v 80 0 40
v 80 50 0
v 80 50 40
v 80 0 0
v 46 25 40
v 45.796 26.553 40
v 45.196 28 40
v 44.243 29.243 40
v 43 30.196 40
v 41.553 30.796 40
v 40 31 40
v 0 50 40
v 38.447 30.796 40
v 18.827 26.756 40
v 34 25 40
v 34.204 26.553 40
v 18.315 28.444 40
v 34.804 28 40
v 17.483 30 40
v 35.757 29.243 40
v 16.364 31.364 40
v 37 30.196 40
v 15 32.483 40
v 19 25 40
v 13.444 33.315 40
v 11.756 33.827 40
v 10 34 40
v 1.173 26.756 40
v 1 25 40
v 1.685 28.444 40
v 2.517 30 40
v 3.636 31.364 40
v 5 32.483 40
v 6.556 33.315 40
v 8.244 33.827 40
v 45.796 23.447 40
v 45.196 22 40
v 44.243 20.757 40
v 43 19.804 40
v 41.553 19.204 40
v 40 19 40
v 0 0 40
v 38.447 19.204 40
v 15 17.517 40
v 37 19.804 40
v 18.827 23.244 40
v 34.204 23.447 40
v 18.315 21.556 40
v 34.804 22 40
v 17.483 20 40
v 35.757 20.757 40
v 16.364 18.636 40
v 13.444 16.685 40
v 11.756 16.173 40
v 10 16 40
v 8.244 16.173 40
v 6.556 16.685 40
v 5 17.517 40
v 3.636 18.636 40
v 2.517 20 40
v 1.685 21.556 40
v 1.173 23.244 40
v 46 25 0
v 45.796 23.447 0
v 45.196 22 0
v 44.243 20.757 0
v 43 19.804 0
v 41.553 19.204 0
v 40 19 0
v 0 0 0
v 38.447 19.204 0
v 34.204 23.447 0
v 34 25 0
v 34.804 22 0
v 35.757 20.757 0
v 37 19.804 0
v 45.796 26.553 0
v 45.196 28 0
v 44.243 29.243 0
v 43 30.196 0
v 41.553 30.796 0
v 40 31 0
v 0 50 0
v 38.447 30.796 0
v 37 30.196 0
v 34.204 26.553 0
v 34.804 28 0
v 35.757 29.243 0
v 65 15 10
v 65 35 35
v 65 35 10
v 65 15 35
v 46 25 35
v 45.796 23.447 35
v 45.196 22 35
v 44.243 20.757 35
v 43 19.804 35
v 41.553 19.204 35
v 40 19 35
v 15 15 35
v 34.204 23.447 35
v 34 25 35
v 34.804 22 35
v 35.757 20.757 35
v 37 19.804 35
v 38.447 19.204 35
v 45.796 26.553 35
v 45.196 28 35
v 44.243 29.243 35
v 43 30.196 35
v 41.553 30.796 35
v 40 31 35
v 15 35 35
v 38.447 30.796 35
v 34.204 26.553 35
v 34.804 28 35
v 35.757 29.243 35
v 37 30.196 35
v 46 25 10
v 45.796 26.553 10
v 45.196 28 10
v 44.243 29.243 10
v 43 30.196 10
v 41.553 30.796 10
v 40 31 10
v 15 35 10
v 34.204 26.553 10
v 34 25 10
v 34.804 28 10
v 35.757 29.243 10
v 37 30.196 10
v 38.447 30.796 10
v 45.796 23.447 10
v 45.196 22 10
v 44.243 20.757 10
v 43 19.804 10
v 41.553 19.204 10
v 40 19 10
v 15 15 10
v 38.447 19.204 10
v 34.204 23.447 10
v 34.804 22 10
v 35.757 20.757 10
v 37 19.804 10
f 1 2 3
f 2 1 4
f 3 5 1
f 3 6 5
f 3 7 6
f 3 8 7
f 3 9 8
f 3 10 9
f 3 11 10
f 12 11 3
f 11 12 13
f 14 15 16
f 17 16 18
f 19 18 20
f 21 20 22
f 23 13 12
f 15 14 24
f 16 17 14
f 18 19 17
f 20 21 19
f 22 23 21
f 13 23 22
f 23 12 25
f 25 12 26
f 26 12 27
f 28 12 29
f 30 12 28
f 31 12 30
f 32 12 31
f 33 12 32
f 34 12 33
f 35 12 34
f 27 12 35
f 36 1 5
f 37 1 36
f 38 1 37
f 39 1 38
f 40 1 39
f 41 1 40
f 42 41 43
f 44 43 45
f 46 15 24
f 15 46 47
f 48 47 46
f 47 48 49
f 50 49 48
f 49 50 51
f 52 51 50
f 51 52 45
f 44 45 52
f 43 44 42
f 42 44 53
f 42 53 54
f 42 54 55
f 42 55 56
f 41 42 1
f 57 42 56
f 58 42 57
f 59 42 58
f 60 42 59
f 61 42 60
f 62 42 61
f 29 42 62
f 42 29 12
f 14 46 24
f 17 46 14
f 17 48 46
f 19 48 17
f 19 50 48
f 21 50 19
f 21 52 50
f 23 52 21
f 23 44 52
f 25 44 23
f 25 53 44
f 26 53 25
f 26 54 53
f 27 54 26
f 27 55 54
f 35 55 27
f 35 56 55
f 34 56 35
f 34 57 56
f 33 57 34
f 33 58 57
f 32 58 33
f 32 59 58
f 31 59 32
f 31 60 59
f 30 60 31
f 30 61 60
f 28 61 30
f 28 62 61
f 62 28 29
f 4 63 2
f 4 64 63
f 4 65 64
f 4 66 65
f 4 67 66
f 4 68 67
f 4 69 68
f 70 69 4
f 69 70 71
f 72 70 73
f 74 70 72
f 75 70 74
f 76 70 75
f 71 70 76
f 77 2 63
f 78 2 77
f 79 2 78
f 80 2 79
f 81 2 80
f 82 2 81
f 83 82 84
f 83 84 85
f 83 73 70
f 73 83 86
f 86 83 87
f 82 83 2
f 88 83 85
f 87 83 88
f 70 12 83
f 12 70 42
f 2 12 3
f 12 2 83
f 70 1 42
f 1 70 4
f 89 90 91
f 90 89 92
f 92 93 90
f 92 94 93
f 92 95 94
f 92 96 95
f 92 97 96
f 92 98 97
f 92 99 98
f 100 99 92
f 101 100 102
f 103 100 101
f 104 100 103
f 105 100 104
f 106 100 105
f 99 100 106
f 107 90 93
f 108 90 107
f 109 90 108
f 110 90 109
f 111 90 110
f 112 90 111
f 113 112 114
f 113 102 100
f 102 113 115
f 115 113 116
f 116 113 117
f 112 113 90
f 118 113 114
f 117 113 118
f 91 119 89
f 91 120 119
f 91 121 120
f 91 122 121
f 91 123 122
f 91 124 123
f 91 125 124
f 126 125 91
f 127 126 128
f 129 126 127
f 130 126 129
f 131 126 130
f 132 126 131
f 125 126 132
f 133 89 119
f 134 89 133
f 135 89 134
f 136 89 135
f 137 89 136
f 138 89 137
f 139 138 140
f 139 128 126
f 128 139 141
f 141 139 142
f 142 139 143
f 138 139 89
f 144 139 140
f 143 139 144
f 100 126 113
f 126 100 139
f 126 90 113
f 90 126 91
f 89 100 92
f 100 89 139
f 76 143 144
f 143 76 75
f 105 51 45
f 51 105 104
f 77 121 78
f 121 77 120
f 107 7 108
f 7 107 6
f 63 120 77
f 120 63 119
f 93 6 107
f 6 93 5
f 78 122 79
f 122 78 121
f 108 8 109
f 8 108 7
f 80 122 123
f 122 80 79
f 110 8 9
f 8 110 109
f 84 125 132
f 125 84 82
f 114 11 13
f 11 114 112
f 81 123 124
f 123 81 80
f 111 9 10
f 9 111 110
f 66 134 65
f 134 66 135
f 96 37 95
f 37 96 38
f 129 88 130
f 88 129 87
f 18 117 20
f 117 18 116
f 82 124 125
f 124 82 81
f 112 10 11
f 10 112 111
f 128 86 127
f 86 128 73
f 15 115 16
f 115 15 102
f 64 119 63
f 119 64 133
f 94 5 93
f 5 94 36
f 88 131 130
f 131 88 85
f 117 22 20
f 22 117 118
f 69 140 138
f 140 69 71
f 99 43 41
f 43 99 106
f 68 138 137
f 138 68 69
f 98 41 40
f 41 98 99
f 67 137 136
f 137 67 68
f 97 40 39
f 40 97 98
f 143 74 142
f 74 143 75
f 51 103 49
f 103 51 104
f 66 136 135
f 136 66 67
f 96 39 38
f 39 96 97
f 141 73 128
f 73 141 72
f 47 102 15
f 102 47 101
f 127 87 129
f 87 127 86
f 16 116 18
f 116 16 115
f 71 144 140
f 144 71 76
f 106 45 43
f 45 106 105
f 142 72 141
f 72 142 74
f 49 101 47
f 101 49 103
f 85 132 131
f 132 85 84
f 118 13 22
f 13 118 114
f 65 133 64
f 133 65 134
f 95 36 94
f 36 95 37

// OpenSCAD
// file: lib/generated_constants.scad
// AUTO-GENERATED from simulation/sizing.py — do not hand edit
P_target_W = 10.0;
A_mem_m2 = 0.72;
active_w = 200.0;
active_h = 300.0;
n_plates = 12;
housing_od = 280.0;
housing_len = 264;
bolt_circle = 240.0;
frame_L = 664;
frame_W = 480.0;
frame_H = 900;
delta_P_bar = 34.58;
plate_pitch = 12;
// main file
include <lib/generated_constants.scad>

module relief_valve_block() {
  difference() {
    cube([80, 50, 40]);
    translate([15, 15, 10]) cube([50, 20, 25]);
    translate([40, 25, -1]) cylinder(h=45, d=12, $fn=24);
    translate([10, 25, 40]) cylinder(h=15, d=18, $fn=32);
  }
  translate([5, 5, 35])
    linear_extrude(2)
      text(str("RV ", delta_P_bar, " bar"), size=5);
}
relief_valve_block();
